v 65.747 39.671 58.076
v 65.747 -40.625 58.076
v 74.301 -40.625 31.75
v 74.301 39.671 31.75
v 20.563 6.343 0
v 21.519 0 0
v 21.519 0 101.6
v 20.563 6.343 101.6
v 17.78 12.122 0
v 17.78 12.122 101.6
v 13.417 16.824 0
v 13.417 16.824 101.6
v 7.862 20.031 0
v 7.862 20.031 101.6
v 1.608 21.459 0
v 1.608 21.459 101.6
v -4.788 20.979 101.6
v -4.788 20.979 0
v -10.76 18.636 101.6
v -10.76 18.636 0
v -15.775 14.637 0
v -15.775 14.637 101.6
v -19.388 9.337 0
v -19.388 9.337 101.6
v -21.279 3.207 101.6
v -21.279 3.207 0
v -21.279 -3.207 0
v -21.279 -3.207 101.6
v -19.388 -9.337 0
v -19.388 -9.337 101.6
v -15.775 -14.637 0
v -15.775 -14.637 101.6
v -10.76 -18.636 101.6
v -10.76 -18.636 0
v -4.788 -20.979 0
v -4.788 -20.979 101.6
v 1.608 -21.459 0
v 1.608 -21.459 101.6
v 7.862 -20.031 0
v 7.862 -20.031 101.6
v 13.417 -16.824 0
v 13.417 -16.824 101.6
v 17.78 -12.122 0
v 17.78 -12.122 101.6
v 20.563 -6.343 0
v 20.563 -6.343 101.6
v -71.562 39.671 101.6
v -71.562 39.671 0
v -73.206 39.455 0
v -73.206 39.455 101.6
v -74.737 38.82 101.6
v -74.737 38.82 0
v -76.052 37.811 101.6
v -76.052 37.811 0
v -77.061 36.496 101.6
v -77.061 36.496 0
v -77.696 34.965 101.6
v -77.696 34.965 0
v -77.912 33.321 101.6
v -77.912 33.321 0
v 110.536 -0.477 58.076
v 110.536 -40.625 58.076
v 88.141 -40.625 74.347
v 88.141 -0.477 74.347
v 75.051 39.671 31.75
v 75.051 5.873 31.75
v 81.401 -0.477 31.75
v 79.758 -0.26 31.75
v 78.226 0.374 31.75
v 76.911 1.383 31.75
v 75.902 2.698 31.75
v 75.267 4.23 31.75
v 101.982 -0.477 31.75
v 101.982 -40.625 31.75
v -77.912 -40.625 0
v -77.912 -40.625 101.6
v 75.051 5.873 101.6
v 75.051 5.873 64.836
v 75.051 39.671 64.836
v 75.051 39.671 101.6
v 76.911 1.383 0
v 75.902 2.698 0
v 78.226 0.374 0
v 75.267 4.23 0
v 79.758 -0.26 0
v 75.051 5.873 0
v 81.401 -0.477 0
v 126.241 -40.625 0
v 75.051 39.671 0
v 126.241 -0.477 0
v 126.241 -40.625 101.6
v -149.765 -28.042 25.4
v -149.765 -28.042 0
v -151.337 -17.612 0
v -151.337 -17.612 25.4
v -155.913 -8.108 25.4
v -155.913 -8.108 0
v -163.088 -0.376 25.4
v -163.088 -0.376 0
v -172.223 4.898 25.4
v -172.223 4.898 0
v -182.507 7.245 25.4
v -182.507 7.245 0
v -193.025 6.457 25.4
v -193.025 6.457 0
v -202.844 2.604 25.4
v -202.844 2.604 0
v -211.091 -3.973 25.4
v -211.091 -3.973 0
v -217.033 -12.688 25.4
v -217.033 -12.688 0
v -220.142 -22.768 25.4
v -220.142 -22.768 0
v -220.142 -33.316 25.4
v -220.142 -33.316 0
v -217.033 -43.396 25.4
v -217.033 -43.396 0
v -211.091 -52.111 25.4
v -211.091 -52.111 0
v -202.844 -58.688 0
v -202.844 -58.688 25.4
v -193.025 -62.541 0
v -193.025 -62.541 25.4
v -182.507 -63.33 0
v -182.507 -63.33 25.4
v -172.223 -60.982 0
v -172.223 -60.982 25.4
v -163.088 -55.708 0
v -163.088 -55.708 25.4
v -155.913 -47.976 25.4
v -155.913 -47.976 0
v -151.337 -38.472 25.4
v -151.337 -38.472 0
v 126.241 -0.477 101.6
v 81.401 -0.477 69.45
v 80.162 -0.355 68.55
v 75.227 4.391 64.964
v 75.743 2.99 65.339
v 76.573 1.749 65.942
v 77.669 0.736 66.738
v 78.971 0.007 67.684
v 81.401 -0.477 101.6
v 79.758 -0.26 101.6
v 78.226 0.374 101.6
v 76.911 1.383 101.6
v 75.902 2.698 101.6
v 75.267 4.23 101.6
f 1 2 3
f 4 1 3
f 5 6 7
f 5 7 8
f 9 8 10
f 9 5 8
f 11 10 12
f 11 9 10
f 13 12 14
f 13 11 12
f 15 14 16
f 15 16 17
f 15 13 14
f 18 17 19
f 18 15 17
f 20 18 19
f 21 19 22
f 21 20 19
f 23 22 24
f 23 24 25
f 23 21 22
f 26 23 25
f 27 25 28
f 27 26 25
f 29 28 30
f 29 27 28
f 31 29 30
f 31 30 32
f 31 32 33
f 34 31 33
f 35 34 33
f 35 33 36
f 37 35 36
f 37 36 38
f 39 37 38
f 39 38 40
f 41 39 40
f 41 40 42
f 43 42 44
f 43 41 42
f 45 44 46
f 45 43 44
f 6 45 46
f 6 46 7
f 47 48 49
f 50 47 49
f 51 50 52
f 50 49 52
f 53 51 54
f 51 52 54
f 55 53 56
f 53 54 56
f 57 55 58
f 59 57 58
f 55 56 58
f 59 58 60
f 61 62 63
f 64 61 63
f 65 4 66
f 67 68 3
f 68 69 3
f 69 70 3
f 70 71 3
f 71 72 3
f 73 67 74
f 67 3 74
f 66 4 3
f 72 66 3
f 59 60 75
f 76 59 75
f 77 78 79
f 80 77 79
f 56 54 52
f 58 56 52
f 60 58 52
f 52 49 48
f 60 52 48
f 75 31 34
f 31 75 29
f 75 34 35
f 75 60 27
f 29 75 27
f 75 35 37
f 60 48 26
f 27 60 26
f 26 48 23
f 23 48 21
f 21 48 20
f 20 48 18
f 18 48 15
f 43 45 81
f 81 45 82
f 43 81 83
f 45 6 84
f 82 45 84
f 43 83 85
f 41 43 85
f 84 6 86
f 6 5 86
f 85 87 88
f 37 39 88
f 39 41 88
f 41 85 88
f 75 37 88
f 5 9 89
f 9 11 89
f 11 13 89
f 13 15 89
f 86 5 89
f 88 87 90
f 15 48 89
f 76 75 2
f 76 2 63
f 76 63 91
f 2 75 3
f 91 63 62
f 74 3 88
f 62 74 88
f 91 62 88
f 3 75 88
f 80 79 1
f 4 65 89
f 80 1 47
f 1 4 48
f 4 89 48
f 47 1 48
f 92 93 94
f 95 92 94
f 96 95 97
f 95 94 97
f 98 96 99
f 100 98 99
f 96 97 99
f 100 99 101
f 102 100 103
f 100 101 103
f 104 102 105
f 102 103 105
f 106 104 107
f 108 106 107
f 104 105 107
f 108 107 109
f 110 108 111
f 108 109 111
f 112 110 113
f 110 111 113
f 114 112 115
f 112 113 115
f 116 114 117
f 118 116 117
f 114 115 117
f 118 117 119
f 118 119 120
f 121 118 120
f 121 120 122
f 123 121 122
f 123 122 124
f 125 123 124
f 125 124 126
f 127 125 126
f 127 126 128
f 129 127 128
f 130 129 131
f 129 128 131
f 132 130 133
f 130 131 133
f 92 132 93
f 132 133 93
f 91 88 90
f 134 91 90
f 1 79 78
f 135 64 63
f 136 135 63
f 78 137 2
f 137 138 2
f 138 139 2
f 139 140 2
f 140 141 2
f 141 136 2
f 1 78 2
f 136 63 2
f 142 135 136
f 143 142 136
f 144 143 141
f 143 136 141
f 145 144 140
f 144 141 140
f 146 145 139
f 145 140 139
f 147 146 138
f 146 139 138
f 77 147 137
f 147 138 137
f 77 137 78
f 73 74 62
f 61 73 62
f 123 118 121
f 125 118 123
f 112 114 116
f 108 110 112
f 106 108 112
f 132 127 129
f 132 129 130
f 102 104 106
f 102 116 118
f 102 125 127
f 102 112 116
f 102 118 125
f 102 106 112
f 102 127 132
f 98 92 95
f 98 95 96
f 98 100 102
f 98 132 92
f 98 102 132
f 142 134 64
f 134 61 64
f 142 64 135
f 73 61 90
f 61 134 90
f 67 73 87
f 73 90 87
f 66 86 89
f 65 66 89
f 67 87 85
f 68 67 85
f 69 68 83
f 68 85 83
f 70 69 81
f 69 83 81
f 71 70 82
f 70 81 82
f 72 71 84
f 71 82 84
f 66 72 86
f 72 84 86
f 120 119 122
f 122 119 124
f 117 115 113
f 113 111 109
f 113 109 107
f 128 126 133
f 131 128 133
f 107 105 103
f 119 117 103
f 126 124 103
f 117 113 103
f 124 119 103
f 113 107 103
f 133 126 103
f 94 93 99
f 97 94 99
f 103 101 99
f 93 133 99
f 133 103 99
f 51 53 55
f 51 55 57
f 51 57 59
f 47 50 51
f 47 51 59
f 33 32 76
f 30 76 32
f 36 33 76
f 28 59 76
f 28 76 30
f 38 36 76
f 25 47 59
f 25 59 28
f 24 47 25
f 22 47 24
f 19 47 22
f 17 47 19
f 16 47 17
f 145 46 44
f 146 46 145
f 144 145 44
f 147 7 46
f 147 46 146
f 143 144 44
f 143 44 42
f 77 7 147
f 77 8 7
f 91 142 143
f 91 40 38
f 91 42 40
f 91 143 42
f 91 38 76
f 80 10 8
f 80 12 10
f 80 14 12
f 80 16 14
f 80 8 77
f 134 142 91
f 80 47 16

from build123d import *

# Parameters (mm, degrees)
F0_R     = 21.519005
F1_DEPTH = 101.6
F3_DEPTH = 80.297088
F4_R     = 35.386517
F5_DEPTH = 25.4


with BuildPart() as f1:
    # F0 (on Top) → F1 (new body)
    with BuildSketch(Plane.XY):
        with BuildLine():
            Line((75.051092, 39.671227), (-71.562003, 39.671227))
            ThreePointArc((-71.562003, 39.671227), (-76.052131, 37.811355), (-77.912003, 33.321227))
            Line((-77.912003, 33.321227), (-77.912003, -40.624861))
            Line((-77.912003, -40.624861), (75.051092, -40.624861))
            Line((75.051092, -40.624861), (126.241401, -40.624861))
            Line((126.241401, -40.624861), (126.241401, -0.476817))
            Line((126.241401, -0.476817), (81.401092, -0.476817))
            ThreePointArc((81.401092, -0.476817), (76.910964, 1.383055), (75.051092, 5.873183))
            Line((75.051092, 5.873183), (75.051092, 39.671227))
        make_face()
        Circle(F0_R, mode=Mode.SUBTRACT)
    extrude(amount=F1_DEPTH)

    # F2 (on face) → F3 (cut, through all)
    with BuildSketch(Plane.XZ.offset(40.624861)):
        Polygon((65.746783, 58.076453), (74.300766, 31.75), (101.982036, 31.75), (110.536019, 58.076453), (88.141401, 74.347095), align=None)
    extrude(amount=-F3_DEPTH, mode=Mode.SUBTRACT)


with BuildPart() as f5:
    # F4 (on Top) → F5 (new body)
    with BuildSketch(Plane.XY):
        with Locations((-185.151085, -28.042102)):
            Circle(F4_R)
    extrude(amount=F5_DEPTH)


solid = Compound([f1.part, f5.part])
